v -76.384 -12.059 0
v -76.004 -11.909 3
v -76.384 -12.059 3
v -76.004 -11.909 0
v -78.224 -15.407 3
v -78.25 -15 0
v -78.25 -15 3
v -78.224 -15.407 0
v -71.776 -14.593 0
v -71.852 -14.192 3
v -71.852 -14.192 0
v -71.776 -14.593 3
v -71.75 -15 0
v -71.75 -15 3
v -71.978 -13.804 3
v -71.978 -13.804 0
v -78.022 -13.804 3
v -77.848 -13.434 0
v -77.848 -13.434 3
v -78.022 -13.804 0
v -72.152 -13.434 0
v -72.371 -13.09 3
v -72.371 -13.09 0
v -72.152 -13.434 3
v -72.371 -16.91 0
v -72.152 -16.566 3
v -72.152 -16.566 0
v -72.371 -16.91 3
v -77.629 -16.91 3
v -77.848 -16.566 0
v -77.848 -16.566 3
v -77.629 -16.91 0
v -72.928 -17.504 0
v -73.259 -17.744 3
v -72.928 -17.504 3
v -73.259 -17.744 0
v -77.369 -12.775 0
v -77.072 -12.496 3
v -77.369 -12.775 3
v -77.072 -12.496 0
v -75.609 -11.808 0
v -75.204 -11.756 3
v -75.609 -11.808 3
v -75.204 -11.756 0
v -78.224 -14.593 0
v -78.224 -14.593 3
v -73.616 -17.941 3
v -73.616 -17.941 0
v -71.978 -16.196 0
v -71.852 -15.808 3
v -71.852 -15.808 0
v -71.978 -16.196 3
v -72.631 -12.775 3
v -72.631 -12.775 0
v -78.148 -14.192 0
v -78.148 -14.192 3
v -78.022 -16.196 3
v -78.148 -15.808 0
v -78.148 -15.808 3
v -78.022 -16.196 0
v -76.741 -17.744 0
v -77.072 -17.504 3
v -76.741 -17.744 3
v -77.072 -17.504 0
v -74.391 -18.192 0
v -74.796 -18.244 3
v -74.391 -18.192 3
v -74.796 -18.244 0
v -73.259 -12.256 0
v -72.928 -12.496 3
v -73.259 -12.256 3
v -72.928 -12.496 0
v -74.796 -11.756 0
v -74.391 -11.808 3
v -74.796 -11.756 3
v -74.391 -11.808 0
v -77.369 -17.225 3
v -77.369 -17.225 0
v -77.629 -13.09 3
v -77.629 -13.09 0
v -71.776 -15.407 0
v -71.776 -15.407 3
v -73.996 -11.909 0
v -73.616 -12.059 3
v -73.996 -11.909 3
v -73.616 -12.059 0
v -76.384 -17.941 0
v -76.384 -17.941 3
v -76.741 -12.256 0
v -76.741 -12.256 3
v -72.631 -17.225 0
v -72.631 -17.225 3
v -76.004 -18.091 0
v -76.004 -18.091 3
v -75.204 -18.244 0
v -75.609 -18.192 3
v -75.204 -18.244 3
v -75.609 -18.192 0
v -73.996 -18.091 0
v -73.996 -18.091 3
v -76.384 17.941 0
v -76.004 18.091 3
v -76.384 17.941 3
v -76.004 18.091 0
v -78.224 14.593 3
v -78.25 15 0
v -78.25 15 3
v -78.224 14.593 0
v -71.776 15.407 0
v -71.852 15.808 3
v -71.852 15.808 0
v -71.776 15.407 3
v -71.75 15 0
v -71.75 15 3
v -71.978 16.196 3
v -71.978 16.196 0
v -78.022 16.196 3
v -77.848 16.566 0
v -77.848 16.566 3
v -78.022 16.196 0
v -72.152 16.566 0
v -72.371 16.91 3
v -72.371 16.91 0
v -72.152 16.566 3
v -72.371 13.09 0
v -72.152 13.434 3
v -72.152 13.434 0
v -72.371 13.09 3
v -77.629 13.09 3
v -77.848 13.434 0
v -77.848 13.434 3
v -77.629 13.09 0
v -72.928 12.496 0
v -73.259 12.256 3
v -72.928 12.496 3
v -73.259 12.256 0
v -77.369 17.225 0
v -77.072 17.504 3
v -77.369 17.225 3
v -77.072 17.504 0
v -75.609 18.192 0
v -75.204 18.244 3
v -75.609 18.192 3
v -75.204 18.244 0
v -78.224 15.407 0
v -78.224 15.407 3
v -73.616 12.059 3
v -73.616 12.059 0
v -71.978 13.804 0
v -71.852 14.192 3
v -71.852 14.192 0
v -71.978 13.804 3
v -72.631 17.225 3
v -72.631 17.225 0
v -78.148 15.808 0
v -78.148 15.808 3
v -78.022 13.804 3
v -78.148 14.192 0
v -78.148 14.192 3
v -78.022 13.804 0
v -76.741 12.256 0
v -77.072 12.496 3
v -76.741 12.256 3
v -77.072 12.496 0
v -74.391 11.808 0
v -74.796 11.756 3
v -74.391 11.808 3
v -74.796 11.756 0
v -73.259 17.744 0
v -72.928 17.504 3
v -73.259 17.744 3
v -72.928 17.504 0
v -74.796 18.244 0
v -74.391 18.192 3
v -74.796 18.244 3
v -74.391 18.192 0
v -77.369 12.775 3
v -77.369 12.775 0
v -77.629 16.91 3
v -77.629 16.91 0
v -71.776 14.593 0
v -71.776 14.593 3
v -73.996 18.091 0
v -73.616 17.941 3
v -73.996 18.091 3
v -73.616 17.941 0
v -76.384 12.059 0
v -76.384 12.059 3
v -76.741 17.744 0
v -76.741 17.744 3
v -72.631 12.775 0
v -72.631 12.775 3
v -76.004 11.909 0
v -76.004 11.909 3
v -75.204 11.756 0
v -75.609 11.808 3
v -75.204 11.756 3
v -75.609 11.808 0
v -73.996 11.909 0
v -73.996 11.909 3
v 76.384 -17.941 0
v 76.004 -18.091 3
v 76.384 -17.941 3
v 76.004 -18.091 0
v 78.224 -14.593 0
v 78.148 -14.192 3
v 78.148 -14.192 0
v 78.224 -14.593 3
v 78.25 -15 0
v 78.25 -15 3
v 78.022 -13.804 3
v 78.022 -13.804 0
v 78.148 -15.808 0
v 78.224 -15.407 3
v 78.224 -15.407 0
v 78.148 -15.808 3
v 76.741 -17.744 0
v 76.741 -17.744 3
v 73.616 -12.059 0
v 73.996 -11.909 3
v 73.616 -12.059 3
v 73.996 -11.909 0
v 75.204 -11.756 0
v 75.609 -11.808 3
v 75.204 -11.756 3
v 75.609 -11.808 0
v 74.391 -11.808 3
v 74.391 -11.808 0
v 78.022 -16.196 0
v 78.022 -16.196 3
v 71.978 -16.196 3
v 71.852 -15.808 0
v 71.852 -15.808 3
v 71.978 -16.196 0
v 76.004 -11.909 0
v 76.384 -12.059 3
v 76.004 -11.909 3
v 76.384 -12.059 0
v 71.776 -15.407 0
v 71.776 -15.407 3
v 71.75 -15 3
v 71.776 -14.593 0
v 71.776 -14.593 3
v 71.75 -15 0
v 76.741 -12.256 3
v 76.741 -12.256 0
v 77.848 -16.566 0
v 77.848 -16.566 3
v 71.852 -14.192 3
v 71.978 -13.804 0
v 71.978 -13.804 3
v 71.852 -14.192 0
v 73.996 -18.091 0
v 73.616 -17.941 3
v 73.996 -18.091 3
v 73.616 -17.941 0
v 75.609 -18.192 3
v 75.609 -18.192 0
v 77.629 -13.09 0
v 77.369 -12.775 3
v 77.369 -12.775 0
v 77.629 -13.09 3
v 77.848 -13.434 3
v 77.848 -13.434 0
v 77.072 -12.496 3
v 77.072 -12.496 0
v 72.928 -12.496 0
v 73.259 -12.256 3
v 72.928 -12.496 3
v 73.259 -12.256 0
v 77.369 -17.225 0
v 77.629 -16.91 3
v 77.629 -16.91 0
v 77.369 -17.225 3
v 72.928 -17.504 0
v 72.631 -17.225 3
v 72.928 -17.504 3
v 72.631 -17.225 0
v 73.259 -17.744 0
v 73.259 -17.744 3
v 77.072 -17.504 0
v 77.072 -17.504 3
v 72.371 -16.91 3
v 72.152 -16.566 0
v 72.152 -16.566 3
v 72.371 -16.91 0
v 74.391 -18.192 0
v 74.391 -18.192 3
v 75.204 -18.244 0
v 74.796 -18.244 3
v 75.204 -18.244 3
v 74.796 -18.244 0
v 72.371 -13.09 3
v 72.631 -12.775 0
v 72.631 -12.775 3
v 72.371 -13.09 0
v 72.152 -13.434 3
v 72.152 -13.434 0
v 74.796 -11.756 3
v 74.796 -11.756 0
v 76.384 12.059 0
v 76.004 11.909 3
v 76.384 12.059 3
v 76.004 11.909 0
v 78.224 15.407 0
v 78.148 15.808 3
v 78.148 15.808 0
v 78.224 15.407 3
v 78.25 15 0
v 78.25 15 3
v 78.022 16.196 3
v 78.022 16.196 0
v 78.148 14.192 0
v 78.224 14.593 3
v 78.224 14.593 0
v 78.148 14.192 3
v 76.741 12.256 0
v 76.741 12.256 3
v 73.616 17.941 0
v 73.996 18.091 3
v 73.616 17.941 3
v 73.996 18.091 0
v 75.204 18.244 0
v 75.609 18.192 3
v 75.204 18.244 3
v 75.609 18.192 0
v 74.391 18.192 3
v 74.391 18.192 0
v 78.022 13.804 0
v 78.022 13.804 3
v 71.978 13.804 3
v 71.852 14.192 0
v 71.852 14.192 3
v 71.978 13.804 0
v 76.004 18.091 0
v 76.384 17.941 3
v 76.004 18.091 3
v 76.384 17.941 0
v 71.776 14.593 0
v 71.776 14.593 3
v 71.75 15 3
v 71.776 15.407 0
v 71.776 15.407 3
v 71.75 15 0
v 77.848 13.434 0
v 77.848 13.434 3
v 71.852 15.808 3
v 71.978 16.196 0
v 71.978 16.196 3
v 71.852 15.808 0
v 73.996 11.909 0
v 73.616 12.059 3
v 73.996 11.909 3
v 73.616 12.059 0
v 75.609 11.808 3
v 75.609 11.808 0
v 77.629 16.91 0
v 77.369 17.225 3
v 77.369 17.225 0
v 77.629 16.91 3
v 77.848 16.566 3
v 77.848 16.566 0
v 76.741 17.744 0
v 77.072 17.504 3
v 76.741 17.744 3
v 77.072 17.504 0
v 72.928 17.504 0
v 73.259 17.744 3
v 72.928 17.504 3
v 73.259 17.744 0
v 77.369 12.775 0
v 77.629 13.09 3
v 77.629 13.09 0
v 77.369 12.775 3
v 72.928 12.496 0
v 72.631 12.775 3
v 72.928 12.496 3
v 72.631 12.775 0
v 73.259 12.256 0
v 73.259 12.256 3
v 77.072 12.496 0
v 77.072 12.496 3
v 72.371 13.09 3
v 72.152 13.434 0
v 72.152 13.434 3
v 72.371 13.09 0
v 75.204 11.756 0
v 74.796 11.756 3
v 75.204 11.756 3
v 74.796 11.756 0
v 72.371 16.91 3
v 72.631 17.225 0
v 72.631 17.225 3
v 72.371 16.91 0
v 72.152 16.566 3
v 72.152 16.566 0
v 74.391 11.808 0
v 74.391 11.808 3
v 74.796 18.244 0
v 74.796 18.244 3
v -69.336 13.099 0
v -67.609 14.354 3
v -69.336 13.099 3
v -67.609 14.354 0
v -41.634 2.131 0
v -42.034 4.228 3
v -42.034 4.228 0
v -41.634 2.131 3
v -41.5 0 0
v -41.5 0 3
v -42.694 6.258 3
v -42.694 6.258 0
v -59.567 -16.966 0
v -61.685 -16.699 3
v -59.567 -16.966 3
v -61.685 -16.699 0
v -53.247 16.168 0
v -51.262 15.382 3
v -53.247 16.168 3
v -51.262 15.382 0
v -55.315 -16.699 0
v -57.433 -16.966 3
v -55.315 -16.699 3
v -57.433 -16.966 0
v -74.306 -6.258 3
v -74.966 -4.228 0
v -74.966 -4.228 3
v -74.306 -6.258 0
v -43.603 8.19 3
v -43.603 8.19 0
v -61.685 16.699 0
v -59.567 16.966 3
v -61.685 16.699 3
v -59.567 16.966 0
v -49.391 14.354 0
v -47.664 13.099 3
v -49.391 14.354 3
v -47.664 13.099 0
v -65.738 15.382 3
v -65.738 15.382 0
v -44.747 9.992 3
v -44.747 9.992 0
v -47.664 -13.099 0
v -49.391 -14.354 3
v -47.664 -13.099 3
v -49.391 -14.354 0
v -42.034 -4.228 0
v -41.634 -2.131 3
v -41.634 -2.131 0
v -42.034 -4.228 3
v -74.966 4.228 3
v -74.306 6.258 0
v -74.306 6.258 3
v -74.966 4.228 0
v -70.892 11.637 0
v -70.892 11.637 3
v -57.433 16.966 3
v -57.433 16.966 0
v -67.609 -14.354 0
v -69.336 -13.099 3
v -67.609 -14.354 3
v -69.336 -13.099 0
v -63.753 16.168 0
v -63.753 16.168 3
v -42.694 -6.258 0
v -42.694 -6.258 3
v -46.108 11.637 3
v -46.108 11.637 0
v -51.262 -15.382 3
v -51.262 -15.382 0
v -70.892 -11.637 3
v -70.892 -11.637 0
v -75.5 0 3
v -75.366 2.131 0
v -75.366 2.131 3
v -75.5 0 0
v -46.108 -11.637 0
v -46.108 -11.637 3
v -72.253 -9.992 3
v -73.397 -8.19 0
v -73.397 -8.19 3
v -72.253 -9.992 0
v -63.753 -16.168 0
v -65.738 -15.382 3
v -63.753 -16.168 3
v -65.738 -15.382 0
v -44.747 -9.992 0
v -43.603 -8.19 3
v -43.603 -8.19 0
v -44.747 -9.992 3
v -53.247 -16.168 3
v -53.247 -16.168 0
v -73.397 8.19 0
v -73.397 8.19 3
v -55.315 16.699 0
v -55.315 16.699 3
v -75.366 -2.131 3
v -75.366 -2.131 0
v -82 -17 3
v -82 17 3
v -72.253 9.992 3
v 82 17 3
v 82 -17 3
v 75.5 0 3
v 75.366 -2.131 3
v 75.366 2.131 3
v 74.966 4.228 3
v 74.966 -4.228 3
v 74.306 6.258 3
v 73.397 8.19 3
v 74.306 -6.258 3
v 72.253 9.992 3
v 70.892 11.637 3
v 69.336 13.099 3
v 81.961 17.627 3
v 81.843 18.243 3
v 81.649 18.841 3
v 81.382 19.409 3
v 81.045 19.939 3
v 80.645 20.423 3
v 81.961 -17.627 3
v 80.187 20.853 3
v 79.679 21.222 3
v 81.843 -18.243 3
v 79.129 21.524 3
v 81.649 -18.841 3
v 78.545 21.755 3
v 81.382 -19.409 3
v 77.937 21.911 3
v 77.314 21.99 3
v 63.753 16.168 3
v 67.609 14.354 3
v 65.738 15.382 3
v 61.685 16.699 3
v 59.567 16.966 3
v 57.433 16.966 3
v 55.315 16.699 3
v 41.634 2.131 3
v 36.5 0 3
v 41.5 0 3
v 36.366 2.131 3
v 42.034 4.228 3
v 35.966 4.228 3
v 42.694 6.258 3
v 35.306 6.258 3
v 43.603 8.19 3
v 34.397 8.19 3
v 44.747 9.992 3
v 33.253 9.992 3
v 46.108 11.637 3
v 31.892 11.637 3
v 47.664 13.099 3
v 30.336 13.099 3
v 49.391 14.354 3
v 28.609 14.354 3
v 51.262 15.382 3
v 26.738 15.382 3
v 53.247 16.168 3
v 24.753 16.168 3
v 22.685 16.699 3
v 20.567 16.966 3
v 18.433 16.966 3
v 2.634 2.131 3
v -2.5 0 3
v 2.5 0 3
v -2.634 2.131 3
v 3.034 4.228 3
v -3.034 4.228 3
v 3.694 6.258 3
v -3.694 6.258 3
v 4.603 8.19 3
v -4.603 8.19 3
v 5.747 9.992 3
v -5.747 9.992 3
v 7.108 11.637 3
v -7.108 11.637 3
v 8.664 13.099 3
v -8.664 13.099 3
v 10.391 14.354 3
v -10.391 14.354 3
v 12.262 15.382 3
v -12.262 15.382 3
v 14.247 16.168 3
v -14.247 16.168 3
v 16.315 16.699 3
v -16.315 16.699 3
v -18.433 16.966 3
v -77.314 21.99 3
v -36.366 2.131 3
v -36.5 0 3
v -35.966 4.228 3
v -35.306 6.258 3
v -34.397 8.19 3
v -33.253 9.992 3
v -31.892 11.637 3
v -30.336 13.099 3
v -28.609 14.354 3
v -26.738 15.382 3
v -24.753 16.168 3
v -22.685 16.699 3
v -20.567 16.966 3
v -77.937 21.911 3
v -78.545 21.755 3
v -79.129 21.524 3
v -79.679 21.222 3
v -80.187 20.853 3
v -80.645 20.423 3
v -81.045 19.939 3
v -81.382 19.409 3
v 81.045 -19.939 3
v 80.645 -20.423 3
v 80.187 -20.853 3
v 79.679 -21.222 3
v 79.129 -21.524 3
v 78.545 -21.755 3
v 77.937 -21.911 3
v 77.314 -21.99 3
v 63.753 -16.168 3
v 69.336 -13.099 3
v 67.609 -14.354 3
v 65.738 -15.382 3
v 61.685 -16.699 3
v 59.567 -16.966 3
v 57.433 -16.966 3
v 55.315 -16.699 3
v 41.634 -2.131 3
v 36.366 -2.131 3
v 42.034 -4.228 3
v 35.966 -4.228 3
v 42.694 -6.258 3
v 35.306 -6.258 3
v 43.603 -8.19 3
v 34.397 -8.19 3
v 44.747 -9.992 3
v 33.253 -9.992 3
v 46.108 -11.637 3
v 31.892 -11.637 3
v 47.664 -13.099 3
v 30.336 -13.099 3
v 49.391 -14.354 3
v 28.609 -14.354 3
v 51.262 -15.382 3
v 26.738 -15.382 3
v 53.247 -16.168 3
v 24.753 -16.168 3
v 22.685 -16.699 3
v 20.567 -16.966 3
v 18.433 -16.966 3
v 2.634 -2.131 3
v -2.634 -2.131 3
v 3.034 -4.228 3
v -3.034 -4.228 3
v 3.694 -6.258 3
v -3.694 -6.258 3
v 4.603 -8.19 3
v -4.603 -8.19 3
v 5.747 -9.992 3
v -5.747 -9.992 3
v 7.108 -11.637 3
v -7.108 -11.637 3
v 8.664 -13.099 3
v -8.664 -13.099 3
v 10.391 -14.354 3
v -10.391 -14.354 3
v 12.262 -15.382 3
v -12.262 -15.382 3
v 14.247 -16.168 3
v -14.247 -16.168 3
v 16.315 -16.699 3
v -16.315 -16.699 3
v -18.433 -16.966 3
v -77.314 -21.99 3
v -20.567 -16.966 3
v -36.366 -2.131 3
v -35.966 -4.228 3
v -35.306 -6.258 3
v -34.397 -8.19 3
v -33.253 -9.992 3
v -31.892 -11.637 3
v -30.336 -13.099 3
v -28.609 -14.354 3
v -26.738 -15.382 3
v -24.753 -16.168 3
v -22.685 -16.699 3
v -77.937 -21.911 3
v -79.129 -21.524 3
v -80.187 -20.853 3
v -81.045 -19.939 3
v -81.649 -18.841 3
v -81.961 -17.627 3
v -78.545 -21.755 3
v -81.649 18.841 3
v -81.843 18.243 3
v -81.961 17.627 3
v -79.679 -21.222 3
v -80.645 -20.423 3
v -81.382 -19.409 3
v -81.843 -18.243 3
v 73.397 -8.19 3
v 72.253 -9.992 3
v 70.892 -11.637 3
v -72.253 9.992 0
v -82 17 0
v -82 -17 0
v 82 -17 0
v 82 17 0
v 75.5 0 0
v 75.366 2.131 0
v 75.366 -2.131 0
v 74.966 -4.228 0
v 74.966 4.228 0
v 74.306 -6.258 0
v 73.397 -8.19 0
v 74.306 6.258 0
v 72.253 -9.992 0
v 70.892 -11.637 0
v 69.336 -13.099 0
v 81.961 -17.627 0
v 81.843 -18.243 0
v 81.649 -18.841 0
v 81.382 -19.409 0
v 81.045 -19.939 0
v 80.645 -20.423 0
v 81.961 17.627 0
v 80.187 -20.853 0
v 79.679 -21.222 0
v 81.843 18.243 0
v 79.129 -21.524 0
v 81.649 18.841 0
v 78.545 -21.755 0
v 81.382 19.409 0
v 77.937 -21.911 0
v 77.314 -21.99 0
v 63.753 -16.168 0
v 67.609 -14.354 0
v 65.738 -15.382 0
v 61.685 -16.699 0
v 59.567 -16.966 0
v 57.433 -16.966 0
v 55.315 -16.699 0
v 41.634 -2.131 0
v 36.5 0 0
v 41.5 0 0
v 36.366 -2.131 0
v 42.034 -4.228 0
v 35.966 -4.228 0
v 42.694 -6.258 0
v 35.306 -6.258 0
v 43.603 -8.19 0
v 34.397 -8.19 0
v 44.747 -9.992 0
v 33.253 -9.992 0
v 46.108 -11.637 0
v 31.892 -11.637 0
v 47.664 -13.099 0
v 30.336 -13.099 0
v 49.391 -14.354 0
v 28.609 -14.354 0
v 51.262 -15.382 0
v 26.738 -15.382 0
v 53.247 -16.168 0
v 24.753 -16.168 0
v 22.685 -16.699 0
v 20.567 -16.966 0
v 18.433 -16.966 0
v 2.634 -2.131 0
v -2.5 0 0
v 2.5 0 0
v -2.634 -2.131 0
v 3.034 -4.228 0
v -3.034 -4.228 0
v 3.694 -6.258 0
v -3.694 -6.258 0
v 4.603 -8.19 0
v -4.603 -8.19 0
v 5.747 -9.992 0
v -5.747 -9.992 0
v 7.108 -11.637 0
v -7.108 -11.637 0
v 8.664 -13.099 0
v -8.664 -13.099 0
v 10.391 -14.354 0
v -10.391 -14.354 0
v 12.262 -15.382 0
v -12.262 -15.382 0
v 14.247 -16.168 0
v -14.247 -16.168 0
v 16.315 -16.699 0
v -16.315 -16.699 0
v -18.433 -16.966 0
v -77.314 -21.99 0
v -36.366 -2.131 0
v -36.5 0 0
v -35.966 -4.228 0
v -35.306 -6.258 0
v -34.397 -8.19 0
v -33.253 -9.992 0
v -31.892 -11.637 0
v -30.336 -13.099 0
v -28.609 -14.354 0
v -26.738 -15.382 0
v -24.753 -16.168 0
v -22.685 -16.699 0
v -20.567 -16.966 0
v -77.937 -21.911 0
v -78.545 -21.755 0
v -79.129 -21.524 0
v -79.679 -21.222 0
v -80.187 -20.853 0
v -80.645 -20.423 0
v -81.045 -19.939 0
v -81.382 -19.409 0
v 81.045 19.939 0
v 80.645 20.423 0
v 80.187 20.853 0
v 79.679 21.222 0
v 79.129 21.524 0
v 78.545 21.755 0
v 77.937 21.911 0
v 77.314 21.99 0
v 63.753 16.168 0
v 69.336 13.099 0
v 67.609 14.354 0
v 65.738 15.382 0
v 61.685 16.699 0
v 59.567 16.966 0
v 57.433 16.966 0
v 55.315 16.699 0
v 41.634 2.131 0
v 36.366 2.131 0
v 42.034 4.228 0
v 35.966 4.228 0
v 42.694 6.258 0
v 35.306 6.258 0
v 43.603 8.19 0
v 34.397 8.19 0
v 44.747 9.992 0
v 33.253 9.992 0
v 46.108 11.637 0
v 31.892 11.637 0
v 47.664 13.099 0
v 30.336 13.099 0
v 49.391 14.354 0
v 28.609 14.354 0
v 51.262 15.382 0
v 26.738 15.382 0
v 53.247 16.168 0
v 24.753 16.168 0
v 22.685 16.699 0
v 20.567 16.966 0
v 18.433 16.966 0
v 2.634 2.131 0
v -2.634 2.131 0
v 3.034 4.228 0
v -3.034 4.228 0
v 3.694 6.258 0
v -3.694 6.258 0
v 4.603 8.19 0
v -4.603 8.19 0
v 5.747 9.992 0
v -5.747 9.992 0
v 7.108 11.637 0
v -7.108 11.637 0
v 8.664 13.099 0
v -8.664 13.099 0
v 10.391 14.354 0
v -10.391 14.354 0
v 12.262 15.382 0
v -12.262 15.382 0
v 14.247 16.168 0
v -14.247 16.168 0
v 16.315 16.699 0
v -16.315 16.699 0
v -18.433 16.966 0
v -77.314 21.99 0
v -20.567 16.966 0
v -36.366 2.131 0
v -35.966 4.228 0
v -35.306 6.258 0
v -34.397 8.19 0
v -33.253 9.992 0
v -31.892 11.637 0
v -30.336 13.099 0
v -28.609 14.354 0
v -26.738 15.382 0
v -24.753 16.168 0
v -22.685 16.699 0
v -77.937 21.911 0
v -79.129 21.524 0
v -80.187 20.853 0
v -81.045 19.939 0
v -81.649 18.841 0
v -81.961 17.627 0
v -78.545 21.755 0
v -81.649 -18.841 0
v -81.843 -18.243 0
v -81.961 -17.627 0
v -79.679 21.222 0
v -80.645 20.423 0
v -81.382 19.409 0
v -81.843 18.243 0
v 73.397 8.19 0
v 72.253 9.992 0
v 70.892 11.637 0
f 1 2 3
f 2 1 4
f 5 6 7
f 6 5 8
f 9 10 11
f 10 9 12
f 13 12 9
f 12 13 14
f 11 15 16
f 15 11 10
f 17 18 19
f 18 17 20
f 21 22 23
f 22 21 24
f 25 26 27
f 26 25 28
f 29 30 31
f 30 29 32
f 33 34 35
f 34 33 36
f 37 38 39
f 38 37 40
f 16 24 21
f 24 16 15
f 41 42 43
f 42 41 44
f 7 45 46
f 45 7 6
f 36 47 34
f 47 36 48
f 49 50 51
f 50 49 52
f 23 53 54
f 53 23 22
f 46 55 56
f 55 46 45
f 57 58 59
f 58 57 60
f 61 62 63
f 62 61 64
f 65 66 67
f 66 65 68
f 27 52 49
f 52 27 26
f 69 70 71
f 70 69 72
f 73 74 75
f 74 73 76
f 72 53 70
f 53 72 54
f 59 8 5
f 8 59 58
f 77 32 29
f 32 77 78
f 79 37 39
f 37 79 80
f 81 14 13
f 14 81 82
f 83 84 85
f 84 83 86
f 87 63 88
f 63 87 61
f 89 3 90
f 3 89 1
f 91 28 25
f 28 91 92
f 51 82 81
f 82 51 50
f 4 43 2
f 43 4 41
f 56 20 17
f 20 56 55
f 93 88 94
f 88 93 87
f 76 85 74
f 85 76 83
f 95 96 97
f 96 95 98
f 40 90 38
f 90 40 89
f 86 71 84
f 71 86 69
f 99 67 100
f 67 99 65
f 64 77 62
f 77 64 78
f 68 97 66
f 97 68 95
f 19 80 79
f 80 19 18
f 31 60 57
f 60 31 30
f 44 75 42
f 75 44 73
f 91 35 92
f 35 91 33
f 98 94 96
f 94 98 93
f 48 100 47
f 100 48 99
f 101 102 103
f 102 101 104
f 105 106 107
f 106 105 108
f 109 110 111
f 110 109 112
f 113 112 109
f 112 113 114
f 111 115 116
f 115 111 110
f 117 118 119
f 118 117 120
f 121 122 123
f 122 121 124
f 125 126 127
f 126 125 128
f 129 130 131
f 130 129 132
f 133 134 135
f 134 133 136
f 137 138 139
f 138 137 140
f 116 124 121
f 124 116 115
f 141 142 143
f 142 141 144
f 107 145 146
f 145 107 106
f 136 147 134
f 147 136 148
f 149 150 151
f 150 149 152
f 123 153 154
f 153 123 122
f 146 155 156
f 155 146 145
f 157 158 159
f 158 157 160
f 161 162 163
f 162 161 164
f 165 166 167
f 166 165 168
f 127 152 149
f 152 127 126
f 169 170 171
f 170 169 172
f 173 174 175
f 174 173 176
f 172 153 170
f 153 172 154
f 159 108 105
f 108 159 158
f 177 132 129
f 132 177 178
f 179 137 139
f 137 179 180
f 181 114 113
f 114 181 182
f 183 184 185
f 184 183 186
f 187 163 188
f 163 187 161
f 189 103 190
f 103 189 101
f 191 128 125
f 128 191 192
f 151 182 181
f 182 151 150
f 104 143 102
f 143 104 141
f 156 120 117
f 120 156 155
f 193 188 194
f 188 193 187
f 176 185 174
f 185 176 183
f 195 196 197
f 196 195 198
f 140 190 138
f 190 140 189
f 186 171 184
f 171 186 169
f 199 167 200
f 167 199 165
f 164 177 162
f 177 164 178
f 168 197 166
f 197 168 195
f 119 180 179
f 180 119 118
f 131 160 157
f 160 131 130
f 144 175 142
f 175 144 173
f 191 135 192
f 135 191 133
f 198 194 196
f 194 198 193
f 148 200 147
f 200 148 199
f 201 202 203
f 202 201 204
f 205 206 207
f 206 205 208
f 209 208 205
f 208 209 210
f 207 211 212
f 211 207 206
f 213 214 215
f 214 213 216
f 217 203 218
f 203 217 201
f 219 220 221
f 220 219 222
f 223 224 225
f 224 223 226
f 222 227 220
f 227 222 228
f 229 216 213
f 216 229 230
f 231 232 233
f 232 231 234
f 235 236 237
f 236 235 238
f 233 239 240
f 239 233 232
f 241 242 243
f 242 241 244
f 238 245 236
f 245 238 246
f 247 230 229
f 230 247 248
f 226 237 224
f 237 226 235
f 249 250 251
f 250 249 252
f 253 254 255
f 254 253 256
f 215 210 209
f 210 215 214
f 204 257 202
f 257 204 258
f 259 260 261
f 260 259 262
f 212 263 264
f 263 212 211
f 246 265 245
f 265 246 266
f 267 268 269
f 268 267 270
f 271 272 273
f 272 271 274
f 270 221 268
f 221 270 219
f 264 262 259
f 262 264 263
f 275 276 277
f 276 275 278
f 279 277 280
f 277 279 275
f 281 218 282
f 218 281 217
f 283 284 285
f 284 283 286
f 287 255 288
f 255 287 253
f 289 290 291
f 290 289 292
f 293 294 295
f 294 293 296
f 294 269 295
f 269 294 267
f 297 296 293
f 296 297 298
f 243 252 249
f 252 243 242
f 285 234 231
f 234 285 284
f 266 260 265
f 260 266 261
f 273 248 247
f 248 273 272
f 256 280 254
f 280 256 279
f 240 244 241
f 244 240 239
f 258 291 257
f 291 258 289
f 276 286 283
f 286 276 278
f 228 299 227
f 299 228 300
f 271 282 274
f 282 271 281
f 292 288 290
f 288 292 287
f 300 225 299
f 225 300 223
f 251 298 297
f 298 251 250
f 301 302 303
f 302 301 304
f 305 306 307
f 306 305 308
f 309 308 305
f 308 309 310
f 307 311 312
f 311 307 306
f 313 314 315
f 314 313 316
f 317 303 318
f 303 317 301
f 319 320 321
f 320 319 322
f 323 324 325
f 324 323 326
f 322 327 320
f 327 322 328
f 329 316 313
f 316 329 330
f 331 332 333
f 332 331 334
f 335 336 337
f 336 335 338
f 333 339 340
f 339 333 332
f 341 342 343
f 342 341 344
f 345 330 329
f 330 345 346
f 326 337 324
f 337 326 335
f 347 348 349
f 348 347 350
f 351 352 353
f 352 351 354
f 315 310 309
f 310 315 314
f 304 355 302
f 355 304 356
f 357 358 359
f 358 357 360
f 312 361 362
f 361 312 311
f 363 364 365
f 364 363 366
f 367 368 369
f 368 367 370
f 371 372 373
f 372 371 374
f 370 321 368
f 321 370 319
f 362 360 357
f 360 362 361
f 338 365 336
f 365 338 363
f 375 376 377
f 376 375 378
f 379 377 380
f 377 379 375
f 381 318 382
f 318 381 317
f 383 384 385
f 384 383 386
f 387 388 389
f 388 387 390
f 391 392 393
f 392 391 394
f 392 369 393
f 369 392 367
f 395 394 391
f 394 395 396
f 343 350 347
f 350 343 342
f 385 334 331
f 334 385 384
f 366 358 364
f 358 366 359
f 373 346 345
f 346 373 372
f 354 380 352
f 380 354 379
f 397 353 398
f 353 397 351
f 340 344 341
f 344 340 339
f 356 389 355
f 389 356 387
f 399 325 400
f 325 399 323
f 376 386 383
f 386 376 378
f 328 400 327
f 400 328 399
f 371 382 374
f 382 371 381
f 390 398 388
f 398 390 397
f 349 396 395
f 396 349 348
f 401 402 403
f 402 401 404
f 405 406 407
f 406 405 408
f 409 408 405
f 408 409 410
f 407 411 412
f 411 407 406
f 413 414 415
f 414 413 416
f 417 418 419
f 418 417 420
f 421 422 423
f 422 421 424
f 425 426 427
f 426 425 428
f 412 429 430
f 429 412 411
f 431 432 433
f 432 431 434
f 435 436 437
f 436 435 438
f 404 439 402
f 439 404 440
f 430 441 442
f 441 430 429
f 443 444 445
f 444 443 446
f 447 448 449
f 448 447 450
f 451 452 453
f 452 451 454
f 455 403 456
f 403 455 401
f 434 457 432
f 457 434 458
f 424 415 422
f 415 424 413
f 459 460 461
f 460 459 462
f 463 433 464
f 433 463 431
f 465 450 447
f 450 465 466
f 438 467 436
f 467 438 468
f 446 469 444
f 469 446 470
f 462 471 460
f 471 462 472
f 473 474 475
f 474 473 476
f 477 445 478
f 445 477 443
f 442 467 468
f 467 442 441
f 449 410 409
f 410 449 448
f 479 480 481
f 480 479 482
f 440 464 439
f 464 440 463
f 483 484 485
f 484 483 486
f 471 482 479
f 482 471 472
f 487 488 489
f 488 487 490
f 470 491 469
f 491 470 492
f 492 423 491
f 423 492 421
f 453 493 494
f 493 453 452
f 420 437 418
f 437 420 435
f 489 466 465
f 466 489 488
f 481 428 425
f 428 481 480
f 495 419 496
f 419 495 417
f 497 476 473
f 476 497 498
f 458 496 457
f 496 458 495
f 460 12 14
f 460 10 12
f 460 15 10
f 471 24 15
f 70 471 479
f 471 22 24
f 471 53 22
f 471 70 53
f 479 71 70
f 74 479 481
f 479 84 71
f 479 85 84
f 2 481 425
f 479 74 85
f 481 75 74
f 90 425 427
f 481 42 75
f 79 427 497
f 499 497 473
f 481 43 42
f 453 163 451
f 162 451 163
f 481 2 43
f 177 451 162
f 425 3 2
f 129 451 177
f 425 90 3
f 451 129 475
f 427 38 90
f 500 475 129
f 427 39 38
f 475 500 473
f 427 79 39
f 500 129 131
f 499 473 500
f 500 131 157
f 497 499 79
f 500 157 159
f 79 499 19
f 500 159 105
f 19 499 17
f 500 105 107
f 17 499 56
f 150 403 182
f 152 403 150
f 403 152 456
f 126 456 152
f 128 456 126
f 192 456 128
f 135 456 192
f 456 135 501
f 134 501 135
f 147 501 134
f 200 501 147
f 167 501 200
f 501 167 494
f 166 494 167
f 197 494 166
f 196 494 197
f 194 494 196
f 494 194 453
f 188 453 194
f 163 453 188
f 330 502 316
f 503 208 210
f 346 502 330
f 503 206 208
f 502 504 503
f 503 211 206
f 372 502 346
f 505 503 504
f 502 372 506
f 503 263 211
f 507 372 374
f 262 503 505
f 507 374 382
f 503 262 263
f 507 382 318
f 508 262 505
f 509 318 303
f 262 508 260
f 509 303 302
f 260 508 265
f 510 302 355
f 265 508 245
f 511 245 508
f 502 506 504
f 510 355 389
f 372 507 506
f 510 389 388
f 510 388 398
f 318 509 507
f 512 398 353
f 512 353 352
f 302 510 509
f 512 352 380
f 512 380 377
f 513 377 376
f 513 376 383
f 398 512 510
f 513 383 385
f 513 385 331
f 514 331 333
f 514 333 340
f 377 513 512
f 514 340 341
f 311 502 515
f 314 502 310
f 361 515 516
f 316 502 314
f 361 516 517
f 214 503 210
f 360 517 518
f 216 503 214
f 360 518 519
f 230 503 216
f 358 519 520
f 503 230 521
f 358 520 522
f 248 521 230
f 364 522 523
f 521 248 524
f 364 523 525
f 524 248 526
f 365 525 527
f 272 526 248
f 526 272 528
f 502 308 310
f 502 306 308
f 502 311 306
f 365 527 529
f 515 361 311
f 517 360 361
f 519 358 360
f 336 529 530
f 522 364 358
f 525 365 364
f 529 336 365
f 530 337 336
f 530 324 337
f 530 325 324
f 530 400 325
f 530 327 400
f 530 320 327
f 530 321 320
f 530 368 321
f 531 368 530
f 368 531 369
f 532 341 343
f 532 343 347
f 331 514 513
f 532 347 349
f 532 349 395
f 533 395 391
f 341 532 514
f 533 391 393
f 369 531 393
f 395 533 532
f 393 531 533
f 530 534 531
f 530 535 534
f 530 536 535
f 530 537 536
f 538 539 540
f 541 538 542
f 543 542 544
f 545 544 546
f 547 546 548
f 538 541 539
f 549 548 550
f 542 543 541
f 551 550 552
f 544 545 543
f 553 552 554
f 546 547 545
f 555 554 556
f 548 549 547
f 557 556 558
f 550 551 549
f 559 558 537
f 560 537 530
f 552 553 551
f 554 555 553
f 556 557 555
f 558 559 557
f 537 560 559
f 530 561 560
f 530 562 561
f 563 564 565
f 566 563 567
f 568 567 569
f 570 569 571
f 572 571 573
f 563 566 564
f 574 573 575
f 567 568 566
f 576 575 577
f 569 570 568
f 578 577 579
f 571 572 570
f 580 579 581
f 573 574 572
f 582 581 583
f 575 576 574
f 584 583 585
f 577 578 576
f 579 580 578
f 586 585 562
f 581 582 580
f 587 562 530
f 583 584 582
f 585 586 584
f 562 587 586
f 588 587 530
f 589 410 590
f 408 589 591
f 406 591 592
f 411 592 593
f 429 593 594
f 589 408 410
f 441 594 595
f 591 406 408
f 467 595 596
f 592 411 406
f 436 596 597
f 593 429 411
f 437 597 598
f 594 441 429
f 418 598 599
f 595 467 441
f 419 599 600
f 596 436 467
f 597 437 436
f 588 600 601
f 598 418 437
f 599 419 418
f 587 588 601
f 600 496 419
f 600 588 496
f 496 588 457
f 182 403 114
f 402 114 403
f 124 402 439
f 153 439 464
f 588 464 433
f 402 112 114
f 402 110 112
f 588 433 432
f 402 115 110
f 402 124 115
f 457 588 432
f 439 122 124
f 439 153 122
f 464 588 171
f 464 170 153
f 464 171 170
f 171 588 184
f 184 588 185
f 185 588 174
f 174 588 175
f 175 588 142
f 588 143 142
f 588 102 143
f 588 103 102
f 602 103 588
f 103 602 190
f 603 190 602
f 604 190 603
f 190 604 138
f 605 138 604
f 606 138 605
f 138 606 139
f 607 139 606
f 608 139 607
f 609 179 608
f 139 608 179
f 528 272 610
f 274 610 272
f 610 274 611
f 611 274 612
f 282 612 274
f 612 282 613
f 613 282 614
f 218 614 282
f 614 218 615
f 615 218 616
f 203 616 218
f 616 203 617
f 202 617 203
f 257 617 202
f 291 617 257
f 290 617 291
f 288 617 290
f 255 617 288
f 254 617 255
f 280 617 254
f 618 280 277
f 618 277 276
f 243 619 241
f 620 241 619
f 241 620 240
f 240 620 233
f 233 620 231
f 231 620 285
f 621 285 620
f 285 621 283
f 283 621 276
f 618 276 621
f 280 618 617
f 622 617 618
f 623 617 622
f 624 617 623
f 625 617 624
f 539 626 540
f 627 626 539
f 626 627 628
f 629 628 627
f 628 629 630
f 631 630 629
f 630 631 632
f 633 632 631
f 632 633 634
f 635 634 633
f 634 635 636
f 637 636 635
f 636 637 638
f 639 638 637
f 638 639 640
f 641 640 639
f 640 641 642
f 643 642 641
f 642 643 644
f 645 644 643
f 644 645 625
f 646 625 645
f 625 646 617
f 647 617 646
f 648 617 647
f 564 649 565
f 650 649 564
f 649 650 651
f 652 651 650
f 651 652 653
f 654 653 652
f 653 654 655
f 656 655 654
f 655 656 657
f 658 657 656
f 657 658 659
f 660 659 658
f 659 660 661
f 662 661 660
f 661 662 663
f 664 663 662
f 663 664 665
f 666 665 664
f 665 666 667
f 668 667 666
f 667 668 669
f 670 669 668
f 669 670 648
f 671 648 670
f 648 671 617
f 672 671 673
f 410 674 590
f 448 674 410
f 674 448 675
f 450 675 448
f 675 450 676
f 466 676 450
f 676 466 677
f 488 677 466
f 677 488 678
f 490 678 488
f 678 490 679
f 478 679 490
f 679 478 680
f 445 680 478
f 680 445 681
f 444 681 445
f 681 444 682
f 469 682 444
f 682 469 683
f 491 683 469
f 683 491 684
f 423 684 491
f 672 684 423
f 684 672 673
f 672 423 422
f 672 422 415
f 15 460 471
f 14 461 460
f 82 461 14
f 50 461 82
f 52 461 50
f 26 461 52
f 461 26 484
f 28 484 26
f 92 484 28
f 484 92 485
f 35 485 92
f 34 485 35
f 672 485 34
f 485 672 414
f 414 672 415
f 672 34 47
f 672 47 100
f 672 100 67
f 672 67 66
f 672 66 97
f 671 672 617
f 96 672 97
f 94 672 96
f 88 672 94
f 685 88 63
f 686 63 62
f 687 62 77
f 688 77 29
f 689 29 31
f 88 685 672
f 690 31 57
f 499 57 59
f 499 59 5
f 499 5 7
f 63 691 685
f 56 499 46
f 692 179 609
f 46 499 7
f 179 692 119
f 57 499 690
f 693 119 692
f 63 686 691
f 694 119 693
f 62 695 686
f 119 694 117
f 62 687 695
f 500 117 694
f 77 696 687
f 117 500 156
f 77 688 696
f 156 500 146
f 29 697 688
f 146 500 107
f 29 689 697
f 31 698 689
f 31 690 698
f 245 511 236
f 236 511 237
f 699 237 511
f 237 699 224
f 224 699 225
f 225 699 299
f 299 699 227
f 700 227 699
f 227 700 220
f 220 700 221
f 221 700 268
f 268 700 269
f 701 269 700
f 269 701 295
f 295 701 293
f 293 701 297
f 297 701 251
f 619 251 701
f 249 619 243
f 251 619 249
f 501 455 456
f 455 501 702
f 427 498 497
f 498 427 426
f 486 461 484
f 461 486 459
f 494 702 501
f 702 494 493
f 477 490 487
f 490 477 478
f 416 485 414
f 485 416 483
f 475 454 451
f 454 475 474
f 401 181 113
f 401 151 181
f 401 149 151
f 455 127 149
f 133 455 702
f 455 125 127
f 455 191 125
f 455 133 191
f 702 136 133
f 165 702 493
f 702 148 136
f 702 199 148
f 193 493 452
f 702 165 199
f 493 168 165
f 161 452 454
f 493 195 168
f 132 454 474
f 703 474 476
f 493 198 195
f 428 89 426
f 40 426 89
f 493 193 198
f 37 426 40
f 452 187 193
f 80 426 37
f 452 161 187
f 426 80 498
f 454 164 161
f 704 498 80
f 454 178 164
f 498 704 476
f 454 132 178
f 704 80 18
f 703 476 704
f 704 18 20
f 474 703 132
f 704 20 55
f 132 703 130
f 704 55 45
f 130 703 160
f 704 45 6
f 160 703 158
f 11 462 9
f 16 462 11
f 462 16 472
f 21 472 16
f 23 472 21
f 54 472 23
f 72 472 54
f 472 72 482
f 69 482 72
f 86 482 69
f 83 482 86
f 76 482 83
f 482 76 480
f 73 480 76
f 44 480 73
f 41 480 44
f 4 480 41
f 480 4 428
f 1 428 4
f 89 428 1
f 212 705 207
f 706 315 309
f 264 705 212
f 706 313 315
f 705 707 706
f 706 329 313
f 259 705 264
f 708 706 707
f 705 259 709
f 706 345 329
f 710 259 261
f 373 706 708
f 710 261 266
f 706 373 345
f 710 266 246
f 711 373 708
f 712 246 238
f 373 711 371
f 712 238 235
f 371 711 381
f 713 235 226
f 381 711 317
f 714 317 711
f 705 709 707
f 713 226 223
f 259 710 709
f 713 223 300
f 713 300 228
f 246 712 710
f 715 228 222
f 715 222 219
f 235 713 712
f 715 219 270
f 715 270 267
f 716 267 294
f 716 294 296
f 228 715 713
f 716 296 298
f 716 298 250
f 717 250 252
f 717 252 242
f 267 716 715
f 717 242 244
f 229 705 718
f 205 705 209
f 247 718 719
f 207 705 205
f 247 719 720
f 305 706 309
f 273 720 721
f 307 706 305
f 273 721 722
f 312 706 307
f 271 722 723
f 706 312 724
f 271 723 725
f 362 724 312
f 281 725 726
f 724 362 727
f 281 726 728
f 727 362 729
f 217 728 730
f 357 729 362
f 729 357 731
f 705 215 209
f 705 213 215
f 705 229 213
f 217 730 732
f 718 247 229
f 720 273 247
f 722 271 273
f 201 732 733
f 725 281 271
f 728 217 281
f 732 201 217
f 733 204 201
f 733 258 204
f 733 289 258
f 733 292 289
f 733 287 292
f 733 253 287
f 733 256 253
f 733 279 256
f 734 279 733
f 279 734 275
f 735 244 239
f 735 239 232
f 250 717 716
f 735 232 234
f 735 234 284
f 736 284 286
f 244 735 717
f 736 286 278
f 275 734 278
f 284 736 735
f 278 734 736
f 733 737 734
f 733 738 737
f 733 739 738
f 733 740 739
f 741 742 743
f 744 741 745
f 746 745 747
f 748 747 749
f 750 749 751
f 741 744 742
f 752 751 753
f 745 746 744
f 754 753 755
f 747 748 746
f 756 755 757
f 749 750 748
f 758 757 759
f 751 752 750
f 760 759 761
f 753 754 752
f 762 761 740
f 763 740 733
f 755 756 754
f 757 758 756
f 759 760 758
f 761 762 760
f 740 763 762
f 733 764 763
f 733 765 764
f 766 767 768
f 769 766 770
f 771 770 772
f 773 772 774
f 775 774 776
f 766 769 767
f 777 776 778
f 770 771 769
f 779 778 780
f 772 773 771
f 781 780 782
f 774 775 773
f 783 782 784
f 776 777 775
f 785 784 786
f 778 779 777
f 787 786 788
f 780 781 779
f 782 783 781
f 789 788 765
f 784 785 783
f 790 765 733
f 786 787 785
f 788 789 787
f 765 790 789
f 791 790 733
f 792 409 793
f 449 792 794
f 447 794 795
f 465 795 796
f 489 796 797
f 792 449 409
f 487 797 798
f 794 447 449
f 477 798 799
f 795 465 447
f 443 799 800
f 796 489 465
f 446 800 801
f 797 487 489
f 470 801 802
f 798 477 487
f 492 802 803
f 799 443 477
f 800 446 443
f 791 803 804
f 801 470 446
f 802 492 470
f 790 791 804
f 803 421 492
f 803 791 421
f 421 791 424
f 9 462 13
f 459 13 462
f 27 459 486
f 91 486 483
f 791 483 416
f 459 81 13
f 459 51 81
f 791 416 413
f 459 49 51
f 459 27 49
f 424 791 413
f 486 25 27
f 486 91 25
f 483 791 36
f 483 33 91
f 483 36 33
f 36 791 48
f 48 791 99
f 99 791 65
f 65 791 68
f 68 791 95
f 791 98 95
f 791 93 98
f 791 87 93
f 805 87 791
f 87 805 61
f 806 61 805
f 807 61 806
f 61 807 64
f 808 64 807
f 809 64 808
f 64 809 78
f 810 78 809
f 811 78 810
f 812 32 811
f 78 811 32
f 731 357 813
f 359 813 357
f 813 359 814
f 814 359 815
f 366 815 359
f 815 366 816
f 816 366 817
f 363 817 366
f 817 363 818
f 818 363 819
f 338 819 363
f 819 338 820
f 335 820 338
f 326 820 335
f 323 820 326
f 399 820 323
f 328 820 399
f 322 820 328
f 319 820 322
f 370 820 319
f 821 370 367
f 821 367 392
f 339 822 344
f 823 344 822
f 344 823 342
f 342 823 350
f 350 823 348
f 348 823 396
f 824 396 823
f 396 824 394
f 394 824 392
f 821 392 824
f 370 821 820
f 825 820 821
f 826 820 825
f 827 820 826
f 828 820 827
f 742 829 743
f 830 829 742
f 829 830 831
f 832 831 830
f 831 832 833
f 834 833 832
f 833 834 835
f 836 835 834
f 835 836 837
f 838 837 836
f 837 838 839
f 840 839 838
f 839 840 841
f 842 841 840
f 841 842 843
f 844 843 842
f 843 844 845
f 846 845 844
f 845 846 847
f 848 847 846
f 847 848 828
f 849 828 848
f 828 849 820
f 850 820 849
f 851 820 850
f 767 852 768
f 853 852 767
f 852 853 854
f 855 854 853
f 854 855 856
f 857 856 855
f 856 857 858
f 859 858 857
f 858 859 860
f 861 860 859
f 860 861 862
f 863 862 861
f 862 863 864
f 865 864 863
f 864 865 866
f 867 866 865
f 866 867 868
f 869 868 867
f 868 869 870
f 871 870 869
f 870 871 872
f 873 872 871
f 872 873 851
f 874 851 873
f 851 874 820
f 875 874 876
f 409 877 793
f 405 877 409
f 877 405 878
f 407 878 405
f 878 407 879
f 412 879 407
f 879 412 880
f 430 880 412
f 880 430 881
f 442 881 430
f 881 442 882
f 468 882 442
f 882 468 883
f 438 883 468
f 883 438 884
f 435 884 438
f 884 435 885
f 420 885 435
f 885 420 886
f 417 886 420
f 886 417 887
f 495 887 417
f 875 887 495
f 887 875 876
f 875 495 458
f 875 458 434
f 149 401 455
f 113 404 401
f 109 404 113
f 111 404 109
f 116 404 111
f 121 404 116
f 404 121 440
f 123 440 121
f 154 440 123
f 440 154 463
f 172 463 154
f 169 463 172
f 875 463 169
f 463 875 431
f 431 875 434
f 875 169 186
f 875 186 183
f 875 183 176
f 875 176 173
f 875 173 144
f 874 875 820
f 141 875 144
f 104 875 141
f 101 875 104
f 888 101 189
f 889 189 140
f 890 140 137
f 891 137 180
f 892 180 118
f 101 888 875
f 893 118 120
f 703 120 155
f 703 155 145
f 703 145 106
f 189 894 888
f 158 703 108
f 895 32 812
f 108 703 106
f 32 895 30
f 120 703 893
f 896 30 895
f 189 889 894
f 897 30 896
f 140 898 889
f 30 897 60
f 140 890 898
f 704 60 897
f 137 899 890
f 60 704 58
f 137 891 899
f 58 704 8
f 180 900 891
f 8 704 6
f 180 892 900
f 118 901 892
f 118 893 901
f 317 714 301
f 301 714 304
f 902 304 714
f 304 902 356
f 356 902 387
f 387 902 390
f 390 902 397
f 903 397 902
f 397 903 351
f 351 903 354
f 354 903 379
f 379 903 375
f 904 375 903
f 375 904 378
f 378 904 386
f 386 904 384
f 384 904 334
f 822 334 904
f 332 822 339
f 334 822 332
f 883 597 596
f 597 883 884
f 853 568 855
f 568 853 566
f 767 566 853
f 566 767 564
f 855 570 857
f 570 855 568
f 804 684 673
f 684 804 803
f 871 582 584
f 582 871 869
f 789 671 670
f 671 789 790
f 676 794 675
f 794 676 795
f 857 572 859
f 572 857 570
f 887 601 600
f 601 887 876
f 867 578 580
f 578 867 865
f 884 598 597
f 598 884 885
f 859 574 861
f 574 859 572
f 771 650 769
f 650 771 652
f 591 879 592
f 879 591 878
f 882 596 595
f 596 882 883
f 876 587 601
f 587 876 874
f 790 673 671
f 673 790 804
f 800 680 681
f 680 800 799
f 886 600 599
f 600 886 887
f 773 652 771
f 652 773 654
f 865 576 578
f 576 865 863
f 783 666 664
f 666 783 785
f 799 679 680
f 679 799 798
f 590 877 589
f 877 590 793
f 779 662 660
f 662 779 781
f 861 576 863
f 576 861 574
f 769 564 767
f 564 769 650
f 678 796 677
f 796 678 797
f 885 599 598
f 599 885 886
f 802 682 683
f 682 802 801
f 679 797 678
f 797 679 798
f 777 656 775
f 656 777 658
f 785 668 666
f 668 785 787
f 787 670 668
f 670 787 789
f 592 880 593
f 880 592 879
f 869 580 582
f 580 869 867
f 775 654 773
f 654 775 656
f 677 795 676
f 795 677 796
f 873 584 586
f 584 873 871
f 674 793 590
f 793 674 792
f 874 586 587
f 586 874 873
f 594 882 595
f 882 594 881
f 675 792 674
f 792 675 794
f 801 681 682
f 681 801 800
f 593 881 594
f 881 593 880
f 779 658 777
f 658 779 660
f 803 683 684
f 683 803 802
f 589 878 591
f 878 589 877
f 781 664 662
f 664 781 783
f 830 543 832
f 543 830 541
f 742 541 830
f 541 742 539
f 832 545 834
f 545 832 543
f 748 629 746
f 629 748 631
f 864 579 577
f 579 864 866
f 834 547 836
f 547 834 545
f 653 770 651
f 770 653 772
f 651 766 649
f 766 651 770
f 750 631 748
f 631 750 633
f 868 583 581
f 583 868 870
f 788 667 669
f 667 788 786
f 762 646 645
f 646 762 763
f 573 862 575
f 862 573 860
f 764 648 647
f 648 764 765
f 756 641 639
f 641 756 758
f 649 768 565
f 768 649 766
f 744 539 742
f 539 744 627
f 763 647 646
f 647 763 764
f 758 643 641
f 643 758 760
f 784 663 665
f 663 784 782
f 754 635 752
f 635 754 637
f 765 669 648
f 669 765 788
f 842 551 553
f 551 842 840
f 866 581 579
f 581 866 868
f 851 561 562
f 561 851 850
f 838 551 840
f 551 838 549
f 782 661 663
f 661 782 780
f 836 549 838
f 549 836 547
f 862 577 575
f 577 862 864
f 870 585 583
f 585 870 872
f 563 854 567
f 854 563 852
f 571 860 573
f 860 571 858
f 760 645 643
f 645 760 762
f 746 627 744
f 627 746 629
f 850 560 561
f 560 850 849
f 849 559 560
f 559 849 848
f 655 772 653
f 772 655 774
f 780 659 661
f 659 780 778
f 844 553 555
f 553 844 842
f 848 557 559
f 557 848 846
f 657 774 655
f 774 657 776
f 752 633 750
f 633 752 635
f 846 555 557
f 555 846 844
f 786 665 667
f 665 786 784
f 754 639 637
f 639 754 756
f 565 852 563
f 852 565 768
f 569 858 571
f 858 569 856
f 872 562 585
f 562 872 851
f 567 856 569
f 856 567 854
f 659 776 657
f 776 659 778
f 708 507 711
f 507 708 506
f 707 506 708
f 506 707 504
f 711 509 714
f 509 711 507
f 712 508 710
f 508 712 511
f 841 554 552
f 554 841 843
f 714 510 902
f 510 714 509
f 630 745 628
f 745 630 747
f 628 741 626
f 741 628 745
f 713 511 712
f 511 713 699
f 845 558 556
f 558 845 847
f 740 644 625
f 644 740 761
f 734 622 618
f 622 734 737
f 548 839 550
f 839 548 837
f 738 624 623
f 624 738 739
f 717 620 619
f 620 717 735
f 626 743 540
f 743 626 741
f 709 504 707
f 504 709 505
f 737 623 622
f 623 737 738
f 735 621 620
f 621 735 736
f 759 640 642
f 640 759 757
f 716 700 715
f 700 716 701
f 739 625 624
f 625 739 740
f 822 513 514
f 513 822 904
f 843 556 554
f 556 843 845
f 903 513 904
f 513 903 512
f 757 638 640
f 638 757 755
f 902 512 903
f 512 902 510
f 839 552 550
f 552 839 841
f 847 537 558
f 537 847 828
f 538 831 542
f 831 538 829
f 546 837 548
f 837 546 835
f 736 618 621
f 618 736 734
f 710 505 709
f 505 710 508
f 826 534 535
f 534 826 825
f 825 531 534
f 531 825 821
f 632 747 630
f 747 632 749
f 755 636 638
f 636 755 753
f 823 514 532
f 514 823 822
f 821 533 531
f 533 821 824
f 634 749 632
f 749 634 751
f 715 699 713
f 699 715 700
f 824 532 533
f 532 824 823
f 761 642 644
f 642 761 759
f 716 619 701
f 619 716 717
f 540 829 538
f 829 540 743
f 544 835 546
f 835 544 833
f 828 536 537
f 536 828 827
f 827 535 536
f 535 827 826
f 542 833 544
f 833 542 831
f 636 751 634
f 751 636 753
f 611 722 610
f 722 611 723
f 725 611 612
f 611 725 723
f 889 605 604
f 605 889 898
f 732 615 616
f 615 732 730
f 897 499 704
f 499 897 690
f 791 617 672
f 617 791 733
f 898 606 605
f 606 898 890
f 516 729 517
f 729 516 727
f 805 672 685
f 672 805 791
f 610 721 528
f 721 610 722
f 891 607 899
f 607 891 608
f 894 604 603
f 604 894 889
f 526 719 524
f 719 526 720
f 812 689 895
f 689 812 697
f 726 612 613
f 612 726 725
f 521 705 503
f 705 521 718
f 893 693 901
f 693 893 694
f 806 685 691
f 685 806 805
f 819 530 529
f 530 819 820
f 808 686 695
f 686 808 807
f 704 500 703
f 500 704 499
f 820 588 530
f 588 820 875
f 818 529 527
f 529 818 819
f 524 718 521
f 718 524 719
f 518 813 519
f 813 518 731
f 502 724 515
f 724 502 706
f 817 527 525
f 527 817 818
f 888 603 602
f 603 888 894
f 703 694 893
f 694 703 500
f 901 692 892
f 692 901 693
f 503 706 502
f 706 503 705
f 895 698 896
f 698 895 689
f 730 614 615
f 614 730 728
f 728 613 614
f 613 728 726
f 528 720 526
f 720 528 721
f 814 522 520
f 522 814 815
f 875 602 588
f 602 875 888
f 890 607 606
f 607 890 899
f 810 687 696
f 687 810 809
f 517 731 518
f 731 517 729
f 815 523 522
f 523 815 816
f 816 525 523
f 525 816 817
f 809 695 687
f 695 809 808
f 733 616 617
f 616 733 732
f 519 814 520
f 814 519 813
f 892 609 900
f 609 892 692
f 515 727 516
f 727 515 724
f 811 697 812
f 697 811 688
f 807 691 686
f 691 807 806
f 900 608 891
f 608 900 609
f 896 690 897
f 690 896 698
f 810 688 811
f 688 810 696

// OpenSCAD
$fn = 50;

difference() {
	union() {
		hull() {
			translate(v = [-77.0, 17.0, 0]) {
				cylinder(h = 3, r = 5);
			}
			translate(v = [77.0, 17.0, 0]) {
				cylinder(h = 3, r = 5);
			}
			translate(v = [-77.0, -17.0, 0]) {
				cylinder(h = 3, r = 5);
			}
			translate(v = [77.0, -17.0, 0]) {
				cylinder(h = 3, r = 5);
			}
		}
	}
	union() {
		translate(v = [-75.0, -15.0, -100.0]) {
			cylinder(h = 200, r = 3.25);
		}
		translate(v = [-75.0, 15.0, -100.0]) {
			cylinder(h = 200, r = 3.25);
		}
		translate(v = [75.0, -15.0, -100.0]) {
			cylinder(h = 200, r = 3.25);
		}
		translate(v = [75.0, 15.0, -100.0]) {
			cylinder(h = 200, r = 3.25);
		}
		translate(v = [-75.0, -15.0, -100.0]) {
			cylinder(h = 200, r = 1.8);
		}
		translate(v = [-75.0, 15.0, -100.0]) {
			cylinder(h = 200, r = 1.8);
		}
		translate(v = [75.0, -15.0, -100.0]) {
			cylinder(h = 200, r = 1.8);
		}
		translate(v = [75.0, 15.0, -100.0]) {
			cylinder(h = 200, r = 1.8);
		}
		translate(v = [-58.5, 0, 0.0]) {
			cylinder(h = 3, r = 17.0);
		}
		translate(v = [-19.5, 0, 0.0]) {
			cylinder(h = 3, r = 17.0);
		}
		translate(v = [19.5, 0, 0.0]) {
			cylinder(h = 3, r = 17.0);
		}
		translate(v = [58.5, 0, 0.0]) {
			cylinder(h = 3, r = 17.0);
		}
	}
}
